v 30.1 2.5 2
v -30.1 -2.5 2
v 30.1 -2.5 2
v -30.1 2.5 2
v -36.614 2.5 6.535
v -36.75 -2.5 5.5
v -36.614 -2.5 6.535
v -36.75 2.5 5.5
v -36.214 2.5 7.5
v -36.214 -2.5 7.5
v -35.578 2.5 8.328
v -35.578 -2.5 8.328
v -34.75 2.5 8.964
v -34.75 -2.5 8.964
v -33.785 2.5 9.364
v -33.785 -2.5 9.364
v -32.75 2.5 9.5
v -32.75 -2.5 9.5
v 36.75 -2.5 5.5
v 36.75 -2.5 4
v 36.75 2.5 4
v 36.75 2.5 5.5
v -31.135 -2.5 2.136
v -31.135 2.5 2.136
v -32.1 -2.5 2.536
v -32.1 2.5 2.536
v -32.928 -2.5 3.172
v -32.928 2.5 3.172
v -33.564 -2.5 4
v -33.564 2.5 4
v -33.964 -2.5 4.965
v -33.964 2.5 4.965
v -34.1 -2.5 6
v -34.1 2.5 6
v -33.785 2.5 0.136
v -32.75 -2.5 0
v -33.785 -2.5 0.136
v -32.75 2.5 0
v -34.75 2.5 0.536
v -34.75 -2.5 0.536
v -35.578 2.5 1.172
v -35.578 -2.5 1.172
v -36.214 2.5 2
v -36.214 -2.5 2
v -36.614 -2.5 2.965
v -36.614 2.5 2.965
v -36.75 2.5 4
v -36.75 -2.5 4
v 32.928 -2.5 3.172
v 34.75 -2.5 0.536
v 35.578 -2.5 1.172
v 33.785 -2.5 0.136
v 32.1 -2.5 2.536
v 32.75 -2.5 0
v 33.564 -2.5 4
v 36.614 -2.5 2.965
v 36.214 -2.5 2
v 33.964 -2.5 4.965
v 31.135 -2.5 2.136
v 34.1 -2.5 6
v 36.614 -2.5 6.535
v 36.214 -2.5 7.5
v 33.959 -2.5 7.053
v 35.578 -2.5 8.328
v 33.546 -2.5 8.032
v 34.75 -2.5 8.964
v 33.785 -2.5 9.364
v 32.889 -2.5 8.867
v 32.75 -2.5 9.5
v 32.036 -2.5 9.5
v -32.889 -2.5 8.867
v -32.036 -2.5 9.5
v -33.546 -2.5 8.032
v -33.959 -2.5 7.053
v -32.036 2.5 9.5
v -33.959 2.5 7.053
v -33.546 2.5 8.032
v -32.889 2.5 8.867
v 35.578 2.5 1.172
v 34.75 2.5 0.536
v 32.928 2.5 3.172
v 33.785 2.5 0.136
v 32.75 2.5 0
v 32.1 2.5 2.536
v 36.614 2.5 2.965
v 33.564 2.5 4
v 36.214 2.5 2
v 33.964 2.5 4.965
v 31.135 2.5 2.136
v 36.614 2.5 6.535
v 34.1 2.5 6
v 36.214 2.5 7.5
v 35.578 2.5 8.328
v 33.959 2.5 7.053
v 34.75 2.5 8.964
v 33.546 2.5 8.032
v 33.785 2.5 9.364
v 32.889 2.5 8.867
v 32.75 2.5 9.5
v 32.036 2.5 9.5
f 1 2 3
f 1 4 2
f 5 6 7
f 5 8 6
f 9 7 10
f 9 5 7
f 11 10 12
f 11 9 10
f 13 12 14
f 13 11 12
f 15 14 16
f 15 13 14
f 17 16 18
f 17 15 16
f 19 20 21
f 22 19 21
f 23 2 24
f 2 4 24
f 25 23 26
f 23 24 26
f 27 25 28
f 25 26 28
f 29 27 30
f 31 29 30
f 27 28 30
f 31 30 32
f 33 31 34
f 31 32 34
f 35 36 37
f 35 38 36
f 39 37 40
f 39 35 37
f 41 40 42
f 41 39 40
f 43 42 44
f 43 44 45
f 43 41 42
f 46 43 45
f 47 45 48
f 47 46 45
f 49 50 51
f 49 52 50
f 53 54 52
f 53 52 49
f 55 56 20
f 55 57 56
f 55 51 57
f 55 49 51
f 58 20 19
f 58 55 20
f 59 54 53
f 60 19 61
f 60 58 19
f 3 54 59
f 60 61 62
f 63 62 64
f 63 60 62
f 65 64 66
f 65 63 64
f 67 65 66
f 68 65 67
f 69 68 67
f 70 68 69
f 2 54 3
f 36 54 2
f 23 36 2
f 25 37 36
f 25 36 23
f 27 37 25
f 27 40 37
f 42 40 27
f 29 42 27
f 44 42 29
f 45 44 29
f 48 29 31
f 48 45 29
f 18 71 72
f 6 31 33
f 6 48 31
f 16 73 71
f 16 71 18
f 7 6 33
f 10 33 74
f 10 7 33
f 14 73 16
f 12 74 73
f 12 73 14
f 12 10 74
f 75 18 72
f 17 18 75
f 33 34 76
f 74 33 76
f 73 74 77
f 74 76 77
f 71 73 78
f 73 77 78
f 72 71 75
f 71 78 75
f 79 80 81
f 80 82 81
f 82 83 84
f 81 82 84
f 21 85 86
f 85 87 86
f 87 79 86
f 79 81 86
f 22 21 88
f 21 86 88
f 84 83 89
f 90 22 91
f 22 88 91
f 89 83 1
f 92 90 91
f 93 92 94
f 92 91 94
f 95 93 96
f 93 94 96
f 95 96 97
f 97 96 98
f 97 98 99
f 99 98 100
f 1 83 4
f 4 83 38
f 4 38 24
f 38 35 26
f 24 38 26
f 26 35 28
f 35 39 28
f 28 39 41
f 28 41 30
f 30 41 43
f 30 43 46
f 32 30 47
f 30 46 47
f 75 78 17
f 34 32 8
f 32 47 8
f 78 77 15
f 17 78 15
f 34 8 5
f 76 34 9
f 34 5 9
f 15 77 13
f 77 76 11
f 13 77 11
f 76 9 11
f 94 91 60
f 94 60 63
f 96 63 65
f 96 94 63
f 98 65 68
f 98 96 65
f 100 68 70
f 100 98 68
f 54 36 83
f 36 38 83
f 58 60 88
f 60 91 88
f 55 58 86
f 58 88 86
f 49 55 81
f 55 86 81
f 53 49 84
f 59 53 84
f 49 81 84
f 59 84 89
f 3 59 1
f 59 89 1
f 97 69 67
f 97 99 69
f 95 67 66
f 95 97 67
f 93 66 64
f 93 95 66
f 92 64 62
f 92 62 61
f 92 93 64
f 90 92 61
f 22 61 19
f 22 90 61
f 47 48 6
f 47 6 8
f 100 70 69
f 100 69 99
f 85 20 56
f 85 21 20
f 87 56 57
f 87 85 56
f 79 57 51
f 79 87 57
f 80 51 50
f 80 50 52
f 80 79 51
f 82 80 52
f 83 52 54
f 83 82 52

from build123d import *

# Parameters (mm, degrees)
F0_W     = 73.5
F0_H     = 5
F1_DEPTH = 10
F2_W     = 68.2
F2_H     = 5
F3_DEPTH = 8
F4_R     = 4
F5_DEPTH = 2
F6_W     = 5
F6_H     = 2
F7_DEPTH = 76.5
F8_R     = 3.99999
F9_DEPTH = 2.5
F10_R    = 4


# Not quite as in the source:
# - a fillet or chamfer is up to 0.001 mm smaller than in the source, because OpenCascade refuses the exact size


with BuildPart() as f1:
    # F0 (on Top) → F1 (new body)
    with BuildSketch(Plane.XY):
        Rectangle(F0_W, F0_H)
    extrude(amount=F1_DEPTH)

    # F2 (on face) → F3 (cut)
    with BuildSketch(Plane.XY.offset(10)):
        Rectangle(F2_W, F2_H)
    extrude(amount=-F3_DEPTH, mode=Mode.SUBTRACT)

    # F4
    f4_edges = [f1.edges().sort_by_distance(p)[0] for p in [
        (34.1, 0, 2),
        (-34.1, 0, 2),
    ]]
    fillet(f4_edges, radius=F4_R)

    # F5 (add): a face of the model
    f5_faces = [f1.faces().sort_by_distance(p)[0] for p in [
        (-35.425, 0, 10),
    ]]
    extrude(f5_faces, amount=F5_DEPTH)

    # F6 (on face) → F7 (join)
    with BuildSketch(Plane.YZ.offset(-34.1)):
        with Locations((0, 11)):
            Rectangle(F6_W, F6_H)
    extrude(amount=F7_DEPTH)

    # F8 (radius 4 in the source; OpenCascade refuses exactly that, so slightly less here)
    f8_edges = [f1.edges().sort_by_distance(p)[0] for p in [
        (-34.1, 0, 10),
        (34.1, 0, 10),
    ]]
    fillet(f8_edges, radius=F8_R)

    # F9 (cut): a face of the model
    f9_faces = [f1.faces().sort_by_distance(p)[0] for p in [
        (2.825, 0, 12),
    ]]
    extrude(f9_faces, amount=-F9_DEPTH, mode=Mode.SUBTRACT)

    # F10
    f10_edges = [f1.edges().sort_by_distance(p)[0] for p in [
        (36.75, 0, 0),
        (-36.75, 0, 9.5),
        (-36.75, 0, 0),
        (36.75, 0, 9.5),
    ]]
    fillet(f10_edges, radius=F10_R)


solid = f1.part
